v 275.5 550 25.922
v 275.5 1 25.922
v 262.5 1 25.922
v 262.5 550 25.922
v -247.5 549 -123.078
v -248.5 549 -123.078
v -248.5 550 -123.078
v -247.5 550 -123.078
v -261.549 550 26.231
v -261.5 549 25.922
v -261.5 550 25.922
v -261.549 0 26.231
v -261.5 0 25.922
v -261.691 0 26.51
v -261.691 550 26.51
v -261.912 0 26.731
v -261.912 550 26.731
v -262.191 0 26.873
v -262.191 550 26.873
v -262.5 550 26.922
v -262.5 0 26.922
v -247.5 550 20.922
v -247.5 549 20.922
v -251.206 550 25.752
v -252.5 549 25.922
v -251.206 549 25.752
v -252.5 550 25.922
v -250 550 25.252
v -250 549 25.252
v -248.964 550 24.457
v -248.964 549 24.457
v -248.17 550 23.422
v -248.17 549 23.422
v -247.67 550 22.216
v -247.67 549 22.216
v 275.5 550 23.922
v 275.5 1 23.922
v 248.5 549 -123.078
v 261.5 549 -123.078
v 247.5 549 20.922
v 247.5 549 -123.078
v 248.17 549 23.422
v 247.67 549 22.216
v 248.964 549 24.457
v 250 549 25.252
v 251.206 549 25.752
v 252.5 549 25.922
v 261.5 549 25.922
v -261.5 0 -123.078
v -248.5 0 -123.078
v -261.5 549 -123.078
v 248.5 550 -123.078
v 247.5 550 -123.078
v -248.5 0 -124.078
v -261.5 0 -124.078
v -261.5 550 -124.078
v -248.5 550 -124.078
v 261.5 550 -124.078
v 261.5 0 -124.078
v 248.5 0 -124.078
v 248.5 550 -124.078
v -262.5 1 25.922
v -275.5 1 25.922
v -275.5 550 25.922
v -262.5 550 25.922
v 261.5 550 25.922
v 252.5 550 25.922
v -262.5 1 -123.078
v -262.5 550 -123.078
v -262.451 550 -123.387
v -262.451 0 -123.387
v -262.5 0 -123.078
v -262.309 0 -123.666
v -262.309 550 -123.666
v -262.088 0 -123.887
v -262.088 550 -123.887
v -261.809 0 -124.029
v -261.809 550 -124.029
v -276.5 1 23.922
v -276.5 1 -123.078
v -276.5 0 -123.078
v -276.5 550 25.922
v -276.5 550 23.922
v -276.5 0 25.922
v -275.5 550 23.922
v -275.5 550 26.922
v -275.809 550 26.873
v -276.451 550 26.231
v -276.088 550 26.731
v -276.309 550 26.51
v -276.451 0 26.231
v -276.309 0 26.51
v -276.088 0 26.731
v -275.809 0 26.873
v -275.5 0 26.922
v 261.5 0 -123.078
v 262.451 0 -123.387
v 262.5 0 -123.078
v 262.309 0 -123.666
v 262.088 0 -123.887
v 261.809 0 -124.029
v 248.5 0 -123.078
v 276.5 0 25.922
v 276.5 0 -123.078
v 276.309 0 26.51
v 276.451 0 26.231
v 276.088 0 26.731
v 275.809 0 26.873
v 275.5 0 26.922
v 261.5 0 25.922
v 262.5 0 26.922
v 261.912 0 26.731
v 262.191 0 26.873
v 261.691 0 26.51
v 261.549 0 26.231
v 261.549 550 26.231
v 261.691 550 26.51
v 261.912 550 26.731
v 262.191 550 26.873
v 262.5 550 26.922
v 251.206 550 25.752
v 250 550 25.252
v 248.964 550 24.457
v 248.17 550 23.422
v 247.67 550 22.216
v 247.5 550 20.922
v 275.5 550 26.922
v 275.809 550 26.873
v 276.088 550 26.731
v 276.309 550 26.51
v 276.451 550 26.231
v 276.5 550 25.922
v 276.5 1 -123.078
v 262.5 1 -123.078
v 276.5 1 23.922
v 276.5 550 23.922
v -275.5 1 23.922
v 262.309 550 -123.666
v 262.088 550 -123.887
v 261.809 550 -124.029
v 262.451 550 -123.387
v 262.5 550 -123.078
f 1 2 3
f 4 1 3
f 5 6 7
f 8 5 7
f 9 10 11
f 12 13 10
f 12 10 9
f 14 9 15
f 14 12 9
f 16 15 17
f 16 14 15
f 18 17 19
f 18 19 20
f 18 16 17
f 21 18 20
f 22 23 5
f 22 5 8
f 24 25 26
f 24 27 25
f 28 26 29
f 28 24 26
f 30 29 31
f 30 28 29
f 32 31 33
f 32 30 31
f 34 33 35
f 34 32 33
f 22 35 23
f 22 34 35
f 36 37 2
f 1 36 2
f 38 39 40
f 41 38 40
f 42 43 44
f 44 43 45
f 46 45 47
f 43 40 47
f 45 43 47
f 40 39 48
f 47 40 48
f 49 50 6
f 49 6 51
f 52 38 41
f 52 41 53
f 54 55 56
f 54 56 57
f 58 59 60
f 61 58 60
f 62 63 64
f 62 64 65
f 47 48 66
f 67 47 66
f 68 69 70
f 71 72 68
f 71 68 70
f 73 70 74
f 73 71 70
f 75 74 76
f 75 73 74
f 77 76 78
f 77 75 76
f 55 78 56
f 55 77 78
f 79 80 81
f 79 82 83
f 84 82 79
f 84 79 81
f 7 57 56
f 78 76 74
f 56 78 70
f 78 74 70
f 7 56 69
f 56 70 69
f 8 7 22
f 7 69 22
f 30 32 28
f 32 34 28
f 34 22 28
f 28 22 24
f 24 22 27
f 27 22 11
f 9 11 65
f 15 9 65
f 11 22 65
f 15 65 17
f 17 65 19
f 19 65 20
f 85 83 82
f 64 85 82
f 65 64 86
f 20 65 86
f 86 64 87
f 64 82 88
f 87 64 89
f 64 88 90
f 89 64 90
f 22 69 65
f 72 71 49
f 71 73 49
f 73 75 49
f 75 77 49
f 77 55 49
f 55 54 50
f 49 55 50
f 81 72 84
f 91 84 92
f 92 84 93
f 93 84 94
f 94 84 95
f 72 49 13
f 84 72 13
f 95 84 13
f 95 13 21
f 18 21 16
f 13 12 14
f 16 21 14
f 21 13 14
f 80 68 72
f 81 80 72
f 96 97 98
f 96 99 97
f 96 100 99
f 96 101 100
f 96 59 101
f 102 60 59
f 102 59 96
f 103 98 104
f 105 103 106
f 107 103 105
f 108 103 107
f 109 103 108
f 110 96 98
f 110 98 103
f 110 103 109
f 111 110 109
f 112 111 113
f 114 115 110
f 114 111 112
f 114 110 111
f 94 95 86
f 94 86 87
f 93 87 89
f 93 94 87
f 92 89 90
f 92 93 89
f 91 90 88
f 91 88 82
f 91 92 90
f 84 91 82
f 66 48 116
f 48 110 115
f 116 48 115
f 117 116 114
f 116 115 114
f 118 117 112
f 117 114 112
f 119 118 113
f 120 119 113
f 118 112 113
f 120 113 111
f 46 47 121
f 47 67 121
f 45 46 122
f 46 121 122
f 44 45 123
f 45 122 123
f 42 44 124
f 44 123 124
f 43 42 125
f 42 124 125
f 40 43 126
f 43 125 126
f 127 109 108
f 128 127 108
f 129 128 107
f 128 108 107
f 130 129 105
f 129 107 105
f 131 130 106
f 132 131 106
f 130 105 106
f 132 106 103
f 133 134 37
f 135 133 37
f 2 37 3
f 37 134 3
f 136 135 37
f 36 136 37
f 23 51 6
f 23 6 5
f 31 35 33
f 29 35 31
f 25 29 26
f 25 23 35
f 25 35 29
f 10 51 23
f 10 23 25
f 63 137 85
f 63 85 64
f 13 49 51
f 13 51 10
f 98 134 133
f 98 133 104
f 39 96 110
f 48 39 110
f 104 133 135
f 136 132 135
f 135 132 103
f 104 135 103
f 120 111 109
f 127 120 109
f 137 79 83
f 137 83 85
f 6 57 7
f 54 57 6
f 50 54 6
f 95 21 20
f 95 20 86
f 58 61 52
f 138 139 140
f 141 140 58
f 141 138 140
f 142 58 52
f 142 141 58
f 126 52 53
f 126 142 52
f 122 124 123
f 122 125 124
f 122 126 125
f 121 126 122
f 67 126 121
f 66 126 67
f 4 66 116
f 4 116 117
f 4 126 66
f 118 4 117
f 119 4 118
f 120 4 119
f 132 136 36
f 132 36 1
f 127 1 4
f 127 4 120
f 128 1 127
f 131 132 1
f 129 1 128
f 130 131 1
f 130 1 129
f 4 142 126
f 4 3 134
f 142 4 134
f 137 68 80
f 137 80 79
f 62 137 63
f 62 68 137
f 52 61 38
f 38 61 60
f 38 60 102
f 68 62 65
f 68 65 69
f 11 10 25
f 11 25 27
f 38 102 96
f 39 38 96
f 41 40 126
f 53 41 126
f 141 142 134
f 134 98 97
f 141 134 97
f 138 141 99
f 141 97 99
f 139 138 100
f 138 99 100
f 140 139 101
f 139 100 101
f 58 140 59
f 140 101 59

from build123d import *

# Parameters (mm, degrees)
F1_DEPTH = 550
F2_W     = 1
F2_H     = 149
F3_DEPTH = 14
F4_R     = 5
F5_W     = 1
F5_H     = 149
F6_DEPTH = 14
F7_DEPTH = 14


with BuildPart() as f1:
    # F0 (on Front) → F1 (new body)
    with BuildSketch(Plane.XZ):
        with BuildLine():
            Line((-275.5, 23.921954), (-275.5, 25.921954))
            Line((-275.5, 25.921954), (-262.5, 25.921954))
            Line((-262.5, 25.921954), (-262.5, -123.078046))
            ThreePointArc((-262.5, -123.078046), (-262.207107, -123.785152), (-261.5, -124.078046))
            Line((-261.5, -124.078046), (-248.5, -124.078046))
            Line((-248.5, -124.078046), (-248.5, -123.078046))
            Line((-248.5, -123.078046), (-261.5, -123.078046))
            Line((-261.5, -123.078046), (-261.5, 25.921954))
            ThreePointArc((-261.5, 25.921954), (-261.792893, 26.629061), (-262.5, 26.921954))
            Line((-262.5, 26.921954), (-275.5, 26.921954))
            ThreePointArc((-275.5, 26.921954), (-276.207107, 26.629061), (-276.5, 25.921954))
            Line((-276.5, 25.921954), (-276.5, 23.921954))
            Line((-276.5, 23.921954), (-275.5, 23.921954))
        make_face()
    extrude(amount=-F1_DEPTH)

    # F2 (on face) → F3 (join)
    with BuildSketch(Plane.YZ.offset(-261.5)):
        with Locations((549.5, -48.578046)):
            Rectangle(F2_W, F2_H)
    extrude(amount=F3_DEPTH)

    # F4
    f4_edges = [f1.edges().sort_by_distance(p)[0] for p in [
        (-247.5, 549.5, 25.921954),
    ]]
    fillet(f4_edges, radius=F4_R)

    # F5 (on face) → F6 (join)
    with BuildSketch(Plane(origin=(-262.5, 0, 0), x_dir=(0, -1, 0), z_dir=(-1, 0, 0))):
        with Locations((-0.5, -48.578046)):
            Rectangle(F5_W, F5_H)
    extrude(amount=F6_DEPTH)

    # F5 (on face) → F7 (join)
    with BuildSketch(Plane(origin=(-262.5, 0, 0), x_dir=(0, -1, 0), z_dir=(-1, 0, 0))):
        with Locations((-0.5, -48.578046)):
            Rectangle(F5_W, F5_H)
    extrude(amount=F7_DEPTH)


with BuildPart() as f8_1:
    # F8: instance of F1
    add(f1.part.mirror(Plane.YZ))


solid = Compound([f1.part, f8_1.part])
